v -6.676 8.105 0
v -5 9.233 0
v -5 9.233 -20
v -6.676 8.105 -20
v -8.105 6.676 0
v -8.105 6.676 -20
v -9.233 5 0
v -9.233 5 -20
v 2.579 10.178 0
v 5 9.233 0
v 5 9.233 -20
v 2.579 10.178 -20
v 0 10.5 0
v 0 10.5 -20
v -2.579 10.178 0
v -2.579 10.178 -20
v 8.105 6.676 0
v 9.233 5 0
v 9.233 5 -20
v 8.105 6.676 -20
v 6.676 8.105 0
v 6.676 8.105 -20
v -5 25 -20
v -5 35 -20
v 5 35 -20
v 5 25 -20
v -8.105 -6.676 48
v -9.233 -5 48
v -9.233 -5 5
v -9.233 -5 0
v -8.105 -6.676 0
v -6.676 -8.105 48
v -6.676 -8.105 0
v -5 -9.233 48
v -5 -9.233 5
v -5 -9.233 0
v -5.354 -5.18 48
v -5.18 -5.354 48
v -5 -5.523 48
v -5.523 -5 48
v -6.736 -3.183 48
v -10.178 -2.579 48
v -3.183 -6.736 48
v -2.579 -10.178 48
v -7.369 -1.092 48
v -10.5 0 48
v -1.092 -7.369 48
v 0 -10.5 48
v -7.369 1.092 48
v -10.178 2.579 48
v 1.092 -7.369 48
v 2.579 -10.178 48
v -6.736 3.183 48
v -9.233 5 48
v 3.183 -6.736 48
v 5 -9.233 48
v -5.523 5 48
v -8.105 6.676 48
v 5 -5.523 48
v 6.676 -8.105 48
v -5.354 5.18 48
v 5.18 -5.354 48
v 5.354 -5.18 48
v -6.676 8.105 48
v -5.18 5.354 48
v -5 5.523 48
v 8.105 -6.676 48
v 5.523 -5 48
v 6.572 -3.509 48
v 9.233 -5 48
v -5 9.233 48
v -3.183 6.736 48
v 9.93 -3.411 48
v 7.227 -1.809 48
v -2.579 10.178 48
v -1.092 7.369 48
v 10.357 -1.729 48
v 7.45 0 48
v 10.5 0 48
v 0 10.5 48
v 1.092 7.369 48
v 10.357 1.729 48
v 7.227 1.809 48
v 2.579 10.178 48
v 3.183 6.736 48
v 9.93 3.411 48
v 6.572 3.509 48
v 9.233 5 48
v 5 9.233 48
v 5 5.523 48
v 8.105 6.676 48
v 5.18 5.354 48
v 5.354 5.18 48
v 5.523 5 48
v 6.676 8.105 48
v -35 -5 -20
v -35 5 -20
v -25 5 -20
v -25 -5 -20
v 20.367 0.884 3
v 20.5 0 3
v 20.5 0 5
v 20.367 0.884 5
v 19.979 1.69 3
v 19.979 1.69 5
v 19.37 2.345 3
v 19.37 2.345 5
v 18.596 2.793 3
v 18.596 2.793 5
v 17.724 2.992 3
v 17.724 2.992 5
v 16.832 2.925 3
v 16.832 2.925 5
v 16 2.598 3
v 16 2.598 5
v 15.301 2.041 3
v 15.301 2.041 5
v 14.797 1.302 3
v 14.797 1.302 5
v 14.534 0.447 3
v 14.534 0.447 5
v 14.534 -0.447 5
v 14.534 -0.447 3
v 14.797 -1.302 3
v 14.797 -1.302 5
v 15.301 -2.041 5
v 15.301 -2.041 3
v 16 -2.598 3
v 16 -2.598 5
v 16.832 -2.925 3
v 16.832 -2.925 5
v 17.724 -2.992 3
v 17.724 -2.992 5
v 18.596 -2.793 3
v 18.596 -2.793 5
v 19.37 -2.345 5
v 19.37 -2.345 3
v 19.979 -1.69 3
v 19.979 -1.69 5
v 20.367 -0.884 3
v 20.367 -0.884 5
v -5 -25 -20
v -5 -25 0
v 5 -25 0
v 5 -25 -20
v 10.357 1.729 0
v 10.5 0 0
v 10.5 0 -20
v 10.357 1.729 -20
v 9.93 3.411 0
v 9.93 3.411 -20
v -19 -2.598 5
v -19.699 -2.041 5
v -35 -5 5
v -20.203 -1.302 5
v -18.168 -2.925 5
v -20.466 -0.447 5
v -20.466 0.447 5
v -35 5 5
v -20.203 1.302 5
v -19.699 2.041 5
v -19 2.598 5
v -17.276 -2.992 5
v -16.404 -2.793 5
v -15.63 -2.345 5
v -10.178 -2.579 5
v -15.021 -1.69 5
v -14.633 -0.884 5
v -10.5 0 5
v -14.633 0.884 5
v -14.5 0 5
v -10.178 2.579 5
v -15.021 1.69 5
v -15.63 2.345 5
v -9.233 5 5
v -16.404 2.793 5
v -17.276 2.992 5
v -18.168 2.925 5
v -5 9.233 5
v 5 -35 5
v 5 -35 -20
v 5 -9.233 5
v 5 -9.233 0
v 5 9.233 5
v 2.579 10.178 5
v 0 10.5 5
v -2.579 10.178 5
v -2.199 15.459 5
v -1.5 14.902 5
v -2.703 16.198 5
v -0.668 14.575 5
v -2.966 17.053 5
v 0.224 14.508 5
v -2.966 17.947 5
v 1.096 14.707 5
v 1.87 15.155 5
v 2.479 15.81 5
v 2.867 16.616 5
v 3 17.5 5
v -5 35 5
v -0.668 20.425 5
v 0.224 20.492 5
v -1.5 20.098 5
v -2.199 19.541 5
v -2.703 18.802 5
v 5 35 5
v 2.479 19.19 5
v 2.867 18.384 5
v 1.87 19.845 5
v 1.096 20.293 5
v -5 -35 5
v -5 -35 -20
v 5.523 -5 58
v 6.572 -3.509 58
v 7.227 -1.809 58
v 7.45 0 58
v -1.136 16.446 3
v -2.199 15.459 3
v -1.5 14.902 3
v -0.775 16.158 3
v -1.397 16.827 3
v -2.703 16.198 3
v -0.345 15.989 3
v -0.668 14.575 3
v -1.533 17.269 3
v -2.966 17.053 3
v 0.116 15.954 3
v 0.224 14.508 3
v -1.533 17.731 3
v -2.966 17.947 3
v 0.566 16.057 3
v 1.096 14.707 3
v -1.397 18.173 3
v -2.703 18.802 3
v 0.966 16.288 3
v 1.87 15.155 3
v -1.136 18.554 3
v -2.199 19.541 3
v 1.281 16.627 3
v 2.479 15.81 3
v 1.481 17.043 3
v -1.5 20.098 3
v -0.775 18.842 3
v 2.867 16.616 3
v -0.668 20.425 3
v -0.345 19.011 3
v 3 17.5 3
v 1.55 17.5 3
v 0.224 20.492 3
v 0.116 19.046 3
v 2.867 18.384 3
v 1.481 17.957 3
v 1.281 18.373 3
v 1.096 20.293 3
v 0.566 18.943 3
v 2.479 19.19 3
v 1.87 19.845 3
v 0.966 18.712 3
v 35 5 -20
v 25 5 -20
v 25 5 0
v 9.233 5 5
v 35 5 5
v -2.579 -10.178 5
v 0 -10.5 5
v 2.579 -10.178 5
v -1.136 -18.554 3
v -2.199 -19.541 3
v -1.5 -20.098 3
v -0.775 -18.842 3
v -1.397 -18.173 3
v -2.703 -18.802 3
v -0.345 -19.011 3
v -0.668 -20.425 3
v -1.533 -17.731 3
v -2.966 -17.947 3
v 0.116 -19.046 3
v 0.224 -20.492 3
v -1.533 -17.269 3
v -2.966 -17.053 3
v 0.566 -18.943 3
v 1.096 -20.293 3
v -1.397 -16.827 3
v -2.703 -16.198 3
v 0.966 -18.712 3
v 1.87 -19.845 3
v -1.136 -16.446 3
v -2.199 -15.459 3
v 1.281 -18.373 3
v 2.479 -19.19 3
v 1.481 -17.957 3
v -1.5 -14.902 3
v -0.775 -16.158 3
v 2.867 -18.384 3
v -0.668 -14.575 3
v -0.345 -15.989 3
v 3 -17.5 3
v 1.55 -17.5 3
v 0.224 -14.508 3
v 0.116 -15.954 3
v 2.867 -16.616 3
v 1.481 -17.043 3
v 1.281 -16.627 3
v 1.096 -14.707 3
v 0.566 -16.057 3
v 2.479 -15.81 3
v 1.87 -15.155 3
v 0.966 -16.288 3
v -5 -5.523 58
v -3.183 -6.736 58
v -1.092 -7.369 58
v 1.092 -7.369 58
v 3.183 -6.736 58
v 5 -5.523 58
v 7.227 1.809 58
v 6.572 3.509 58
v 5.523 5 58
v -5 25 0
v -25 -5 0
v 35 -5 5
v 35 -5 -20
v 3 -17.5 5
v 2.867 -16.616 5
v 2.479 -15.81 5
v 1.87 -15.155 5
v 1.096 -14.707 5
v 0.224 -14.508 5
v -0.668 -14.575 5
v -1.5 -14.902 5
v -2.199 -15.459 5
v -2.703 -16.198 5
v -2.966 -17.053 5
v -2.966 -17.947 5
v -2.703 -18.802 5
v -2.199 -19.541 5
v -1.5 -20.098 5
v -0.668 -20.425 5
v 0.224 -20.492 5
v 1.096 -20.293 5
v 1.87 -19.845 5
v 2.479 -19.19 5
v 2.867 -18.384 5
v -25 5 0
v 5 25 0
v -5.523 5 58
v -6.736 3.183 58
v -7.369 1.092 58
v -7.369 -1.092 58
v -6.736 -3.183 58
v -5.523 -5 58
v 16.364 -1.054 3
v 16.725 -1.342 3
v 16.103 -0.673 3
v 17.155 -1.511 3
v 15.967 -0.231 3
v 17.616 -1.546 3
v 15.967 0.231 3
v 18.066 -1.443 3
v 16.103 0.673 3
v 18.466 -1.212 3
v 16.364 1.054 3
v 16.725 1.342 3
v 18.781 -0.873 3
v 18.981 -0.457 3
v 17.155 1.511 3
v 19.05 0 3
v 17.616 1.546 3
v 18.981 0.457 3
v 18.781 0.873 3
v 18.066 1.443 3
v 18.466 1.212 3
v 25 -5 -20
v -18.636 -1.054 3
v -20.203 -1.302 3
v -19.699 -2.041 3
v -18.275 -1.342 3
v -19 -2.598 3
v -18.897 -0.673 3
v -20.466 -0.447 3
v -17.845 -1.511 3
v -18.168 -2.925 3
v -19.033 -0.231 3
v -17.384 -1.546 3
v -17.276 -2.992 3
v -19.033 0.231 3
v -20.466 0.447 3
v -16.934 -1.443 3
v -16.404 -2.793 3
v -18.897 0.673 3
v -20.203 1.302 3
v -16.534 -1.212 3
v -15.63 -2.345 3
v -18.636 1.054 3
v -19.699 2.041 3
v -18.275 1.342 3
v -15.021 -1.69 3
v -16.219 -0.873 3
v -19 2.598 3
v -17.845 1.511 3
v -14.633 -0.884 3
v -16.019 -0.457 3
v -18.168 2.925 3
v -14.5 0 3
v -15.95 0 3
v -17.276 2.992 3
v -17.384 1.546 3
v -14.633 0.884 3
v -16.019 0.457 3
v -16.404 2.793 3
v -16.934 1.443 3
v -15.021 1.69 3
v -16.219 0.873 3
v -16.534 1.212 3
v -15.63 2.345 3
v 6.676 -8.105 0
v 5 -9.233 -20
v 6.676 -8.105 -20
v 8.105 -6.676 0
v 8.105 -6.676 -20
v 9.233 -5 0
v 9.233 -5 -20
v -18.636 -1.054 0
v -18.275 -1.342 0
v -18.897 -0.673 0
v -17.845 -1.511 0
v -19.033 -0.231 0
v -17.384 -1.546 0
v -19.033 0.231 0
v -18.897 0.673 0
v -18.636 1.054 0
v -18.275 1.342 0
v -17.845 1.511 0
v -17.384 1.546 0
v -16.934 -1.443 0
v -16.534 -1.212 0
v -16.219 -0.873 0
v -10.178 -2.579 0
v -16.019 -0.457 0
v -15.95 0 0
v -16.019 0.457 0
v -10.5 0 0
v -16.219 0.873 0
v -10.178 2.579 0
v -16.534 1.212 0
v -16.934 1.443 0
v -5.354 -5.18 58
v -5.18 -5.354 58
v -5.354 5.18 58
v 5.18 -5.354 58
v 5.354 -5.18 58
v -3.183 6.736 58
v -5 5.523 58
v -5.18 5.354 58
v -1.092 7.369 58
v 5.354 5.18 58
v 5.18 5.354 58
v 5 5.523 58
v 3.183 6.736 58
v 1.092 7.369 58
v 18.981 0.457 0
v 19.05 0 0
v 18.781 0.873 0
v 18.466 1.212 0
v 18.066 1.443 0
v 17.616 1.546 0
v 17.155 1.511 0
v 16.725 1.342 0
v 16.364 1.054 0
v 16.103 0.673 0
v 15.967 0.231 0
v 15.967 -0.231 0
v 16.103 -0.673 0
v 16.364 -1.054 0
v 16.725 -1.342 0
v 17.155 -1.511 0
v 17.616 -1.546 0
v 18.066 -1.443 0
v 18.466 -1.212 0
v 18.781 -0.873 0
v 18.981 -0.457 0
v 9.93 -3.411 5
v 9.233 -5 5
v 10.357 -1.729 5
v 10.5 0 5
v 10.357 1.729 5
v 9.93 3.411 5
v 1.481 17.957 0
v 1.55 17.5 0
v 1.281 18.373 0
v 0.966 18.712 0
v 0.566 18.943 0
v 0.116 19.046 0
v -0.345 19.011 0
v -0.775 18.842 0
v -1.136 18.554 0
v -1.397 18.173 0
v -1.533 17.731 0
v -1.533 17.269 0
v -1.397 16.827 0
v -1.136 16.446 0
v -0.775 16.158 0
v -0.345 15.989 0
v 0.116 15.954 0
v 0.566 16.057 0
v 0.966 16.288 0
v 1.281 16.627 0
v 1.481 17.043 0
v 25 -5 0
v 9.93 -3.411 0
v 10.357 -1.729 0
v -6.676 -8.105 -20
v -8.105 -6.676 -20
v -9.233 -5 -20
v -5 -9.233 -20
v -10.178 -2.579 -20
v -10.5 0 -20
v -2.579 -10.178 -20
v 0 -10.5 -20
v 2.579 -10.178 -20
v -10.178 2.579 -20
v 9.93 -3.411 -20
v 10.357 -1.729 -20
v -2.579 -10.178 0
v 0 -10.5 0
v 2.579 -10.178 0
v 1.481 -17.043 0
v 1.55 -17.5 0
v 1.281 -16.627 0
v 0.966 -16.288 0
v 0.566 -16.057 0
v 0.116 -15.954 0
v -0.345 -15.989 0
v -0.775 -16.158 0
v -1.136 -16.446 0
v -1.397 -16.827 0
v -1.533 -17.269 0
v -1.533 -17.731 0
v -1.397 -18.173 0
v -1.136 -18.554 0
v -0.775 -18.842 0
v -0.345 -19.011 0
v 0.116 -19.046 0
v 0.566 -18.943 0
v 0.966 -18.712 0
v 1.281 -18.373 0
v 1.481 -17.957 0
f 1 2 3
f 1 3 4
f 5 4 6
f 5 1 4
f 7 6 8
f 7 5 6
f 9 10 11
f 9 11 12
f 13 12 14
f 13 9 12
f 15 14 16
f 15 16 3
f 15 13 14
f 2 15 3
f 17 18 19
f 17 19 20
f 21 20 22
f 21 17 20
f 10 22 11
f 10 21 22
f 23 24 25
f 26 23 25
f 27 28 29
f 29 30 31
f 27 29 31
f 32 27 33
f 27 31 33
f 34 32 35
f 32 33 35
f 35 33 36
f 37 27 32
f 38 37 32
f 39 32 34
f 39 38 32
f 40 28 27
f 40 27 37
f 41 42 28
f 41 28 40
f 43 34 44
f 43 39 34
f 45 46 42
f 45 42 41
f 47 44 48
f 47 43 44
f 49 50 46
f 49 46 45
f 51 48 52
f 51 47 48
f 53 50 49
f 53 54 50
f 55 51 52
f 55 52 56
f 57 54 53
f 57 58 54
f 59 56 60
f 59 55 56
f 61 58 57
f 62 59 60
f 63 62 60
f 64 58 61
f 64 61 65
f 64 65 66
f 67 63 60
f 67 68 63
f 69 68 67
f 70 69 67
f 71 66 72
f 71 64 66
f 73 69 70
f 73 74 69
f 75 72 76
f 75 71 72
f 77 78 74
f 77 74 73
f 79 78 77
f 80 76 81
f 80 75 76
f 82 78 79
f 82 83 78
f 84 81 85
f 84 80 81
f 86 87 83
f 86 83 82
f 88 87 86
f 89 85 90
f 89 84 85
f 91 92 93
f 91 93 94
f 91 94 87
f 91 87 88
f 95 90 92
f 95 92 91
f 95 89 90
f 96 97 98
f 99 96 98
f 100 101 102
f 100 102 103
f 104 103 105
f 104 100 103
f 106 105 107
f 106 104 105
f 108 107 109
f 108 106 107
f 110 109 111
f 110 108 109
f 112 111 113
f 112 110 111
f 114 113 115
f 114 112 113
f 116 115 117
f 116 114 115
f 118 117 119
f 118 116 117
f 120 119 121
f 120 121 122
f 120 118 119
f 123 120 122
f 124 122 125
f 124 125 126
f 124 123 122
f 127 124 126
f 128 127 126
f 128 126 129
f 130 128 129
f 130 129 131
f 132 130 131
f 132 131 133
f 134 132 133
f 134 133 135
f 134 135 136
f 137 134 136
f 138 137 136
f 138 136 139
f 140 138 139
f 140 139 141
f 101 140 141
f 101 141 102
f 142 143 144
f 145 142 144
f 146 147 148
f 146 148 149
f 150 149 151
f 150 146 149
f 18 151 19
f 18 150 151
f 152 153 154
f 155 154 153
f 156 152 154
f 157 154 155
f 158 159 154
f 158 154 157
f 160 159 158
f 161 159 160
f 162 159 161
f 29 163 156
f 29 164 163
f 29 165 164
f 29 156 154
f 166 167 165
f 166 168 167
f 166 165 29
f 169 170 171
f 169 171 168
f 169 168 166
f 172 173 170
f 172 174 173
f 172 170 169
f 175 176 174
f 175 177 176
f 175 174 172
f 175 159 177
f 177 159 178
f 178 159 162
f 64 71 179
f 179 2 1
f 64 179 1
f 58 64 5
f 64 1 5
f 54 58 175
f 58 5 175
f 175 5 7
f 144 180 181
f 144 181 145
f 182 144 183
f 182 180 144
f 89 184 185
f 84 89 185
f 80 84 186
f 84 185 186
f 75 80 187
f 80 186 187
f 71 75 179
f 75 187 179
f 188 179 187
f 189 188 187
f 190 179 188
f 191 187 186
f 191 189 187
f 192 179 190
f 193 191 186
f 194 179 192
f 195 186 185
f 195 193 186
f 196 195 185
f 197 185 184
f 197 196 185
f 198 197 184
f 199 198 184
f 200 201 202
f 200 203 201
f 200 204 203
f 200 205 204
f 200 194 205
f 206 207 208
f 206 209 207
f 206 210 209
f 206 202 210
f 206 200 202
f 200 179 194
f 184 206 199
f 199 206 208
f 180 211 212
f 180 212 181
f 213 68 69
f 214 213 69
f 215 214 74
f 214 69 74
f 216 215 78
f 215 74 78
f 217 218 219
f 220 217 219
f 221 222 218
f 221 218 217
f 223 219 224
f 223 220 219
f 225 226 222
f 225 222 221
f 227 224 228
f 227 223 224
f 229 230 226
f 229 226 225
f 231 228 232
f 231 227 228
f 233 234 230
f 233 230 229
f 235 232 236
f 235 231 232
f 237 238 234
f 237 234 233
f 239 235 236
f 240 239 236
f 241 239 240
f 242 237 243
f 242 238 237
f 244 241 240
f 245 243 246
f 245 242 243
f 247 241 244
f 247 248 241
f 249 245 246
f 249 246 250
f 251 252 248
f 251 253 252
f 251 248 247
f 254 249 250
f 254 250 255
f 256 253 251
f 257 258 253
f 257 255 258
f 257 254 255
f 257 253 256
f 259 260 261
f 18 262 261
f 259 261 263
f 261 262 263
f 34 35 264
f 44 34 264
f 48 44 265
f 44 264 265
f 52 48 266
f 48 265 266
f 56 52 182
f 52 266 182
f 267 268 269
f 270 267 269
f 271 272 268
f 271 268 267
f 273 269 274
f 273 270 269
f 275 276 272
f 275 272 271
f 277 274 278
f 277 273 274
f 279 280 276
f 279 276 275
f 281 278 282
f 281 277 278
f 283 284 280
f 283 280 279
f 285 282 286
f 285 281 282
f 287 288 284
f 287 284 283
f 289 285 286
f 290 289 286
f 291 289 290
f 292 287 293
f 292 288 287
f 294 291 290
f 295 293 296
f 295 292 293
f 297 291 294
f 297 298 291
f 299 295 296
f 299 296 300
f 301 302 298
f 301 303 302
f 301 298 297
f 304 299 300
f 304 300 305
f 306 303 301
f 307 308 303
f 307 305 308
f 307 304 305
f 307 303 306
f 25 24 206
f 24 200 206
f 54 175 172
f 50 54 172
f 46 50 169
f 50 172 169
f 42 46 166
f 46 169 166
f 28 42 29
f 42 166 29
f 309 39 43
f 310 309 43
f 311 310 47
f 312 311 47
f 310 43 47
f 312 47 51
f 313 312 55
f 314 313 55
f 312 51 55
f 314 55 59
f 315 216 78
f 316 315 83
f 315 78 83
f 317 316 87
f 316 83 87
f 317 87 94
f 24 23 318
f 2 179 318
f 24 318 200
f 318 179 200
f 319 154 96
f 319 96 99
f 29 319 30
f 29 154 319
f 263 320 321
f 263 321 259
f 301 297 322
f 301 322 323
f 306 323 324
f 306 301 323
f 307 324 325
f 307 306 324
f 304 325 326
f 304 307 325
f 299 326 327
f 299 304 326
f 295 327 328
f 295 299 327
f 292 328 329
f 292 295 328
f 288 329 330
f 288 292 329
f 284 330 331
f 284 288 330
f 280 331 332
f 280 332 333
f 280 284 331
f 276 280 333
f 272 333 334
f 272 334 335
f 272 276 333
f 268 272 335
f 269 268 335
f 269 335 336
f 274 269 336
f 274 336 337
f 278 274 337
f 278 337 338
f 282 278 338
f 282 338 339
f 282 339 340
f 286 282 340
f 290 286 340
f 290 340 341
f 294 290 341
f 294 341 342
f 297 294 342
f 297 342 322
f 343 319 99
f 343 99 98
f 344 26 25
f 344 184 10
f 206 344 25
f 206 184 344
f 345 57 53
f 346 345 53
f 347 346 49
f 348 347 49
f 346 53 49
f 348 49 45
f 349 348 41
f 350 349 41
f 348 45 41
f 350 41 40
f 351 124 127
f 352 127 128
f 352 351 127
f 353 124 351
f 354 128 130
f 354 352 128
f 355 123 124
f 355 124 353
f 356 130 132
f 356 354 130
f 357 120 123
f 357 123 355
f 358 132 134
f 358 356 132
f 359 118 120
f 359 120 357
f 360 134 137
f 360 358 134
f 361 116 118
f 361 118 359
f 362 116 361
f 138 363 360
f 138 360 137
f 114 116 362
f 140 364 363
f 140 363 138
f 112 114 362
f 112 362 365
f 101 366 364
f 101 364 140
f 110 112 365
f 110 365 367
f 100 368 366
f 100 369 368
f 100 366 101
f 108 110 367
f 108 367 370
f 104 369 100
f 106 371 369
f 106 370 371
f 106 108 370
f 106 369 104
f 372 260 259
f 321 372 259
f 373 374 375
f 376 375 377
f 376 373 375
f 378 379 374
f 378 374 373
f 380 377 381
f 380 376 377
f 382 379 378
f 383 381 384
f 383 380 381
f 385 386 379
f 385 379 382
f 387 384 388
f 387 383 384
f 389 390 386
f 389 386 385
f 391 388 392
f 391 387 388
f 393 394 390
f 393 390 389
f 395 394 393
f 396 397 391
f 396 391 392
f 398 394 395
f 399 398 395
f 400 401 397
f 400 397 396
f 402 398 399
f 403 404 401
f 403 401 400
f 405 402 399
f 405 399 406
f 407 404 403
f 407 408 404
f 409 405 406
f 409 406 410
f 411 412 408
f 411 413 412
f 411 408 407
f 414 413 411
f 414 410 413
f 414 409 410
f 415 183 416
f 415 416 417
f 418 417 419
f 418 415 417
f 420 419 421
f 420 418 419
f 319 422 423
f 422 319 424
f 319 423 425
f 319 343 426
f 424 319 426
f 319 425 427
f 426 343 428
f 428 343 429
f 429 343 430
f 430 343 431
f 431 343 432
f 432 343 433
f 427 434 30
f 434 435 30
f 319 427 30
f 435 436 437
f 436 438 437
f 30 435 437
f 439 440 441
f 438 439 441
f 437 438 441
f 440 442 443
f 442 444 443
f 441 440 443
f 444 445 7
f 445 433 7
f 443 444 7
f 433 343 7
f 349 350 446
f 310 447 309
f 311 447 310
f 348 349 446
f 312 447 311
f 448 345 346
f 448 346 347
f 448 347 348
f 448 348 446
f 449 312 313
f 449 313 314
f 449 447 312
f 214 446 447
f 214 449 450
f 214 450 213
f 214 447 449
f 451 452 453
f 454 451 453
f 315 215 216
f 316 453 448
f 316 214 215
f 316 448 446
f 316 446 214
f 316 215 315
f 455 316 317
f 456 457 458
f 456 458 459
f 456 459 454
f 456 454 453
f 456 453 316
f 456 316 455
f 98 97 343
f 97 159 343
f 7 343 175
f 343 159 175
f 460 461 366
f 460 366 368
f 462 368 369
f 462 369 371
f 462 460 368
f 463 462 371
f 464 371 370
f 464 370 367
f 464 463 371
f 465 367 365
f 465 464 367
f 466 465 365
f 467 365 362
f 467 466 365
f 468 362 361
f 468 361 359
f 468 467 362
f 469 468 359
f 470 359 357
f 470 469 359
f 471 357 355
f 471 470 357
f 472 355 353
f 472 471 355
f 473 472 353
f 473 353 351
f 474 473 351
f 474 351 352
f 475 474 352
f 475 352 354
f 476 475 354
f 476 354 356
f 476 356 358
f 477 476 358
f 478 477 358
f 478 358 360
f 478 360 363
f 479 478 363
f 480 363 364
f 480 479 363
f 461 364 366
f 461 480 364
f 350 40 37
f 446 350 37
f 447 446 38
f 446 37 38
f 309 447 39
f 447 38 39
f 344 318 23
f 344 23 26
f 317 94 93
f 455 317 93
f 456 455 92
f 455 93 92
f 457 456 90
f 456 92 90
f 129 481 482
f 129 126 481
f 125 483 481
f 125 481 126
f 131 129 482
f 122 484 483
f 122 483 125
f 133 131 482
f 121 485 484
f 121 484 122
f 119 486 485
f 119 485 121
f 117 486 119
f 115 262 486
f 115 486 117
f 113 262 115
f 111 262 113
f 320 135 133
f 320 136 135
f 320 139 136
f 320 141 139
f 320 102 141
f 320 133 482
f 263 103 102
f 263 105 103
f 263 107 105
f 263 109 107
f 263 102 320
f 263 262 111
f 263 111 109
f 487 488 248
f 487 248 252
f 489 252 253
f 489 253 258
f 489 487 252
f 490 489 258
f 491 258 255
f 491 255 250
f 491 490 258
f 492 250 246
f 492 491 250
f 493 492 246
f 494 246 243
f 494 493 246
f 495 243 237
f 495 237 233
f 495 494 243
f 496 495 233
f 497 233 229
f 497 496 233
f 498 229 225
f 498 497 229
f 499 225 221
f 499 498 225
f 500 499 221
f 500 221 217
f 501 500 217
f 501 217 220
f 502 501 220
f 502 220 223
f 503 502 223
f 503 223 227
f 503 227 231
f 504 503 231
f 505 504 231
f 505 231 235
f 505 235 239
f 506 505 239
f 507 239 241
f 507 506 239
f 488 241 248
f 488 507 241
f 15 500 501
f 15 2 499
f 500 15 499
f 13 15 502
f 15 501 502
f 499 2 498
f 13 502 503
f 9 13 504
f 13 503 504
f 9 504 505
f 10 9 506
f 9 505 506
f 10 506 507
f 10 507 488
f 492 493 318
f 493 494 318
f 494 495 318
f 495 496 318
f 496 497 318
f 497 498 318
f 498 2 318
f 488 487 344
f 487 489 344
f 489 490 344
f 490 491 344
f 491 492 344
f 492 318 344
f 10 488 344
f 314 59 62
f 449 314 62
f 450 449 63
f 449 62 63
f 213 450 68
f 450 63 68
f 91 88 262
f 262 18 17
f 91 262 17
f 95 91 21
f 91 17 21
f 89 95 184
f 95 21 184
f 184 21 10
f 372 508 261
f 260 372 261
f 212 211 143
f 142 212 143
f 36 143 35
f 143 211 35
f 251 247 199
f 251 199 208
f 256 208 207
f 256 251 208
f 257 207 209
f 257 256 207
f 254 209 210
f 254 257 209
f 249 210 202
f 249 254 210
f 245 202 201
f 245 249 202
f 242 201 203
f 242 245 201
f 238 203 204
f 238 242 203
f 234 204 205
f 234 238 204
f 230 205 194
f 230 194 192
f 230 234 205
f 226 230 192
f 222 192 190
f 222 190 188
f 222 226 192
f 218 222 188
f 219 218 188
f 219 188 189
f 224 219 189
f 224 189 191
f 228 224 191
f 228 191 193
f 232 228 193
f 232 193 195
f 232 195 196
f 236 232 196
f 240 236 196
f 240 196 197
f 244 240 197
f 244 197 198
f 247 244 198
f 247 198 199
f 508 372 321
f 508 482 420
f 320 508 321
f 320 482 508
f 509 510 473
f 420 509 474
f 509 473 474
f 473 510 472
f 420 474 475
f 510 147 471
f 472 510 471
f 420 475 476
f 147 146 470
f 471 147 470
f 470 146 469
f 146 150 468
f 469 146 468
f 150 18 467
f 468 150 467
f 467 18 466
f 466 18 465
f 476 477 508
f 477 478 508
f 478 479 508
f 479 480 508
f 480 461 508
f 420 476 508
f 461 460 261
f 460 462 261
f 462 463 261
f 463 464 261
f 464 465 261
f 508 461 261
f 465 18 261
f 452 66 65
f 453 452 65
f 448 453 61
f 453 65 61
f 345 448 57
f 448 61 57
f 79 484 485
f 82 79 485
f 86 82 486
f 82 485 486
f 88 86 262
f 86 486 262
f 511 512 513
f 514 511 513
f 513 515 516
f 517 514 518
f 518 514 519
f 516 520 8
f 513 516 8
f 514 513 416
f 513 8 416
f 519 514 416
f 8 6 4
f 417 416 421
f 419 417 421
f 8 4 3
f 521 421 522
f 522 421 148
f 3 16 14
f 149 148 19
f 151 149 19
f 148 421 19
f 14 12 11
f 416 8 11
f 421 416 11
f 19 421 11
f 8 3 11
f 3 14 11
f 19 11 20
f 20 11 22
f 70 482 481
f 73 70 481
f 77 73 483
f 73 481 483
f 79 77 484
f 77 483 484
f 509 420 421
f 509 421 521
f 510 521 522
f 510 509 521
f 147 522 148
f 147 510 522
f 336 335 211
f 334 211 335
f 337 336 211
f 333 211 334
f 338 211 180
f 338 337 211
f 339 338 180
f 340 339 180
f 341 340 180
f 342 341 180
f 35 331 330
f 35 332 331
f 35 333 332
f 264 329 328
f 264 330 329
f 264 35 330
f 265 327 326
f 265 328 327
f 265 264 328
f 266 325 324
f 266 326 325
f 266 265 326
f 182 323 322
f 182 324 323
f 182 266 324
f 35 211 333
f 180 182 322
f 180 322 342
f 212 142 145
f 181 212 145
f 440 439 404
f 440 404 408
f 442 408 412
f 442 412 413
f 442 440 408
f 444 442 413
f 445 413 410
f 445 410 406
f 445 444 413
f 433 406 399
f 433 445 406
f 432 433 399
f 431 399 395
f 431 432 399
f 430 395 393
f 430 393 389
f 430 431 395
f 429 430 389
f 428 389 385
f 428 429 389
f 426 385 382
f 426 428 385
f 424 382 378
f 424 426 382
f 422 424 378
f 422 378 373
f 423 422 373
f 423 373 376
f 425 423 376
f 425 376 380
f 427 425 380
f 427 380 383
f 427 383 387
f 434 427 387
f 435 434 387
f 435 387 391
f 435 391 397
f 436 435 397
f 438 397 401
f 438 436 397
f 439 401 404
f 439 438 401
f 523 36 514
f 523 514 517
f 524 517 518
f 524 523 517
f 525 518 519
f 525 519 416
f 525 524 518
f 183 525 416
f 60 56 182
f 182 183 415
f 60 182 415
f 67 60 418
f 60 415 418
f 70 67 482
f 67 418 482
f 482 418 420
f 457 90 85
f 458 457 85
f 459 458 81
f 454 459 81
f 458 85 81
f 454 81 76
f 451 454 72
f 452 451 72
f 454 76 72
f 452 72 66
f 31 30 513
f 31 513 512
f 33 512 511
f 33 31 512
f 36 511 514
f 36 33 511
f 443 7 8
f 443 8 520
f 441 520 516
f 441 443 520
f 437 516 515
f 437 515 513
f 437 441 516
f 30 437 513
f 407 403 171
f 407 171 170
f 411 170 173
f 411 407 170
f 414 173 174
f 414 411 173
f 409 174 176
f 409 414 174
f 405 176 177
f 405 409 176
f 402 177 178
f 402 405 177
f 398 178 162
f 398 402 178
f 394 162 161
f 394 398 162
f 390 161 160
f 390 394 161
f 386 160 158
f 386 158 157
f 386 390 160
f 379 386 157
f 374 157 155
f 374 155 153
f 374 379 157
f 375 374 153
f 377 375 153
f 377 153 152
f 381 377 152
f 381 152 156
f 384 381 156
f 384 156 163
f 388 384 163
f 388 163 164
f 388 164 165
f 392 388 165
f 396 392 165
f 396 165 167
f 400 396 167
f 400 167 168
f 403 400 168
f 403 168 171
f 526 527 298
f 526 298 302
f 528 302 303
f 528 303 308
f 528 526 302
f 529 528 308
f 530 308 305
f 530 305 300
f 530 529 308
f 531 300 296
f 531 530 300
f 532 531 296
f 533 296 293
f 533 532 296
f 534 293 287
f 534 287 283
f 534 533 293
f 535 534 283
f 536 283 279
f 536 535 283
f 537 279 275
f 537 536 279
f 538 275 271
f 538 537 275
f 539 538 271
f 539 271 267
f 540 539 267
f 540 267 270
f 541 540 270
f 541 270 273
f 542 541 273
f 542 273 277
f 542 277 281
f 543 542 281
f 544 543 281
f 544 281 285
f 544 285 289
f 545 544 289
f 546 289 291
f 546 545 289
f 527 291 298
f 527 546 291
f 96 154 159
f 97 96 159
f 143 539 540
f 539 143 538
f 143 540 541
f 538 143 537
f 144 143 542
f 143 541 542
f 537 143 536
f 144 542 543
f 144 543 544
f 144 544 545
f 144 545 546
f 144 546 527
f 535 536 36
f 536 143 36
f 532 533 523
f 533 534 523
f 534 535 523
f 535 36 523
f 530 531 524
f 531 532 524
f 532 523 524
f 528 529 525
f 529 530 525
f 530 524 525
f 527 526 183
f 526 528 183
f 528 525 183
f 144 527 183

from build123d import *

# Parameters (mm, degrees)
F0_R          = 3
F1_DEPTH      = 5
F0_R_2        = 1.55
F2_DEPTH      = 3
F0_W          = 10
F0_H          = 10
F3_DEPTH      = 5
F3_DEPTH_BACK = 20
F4_DEPTH      = 48
F4_DEPTH_BACK = 20
F5_DEPTH      = 58


with BuildPart() as f1:
    # F0 (on Top) → F1 (new body)
    with BuildSketch(Plane.XY):
        with BuildLine():
            ThreePointArc((-9.2330926563, -5), (-10.5, 0), (-9.2330926563, 5))
            Line((-9.2330926563, 5), (-25, 5))
            Line((-25, 5), (-25, -5))
            Line((-25, -5), (-9.2330926563, -5))
        make_face()
        with Locations((-17.5, 0)):
            Circle(F0_R, mode=Mode.SUBTRACT)
    extrude(amount=F1_DEPTH)

    # F0 (on Top) → F2, piece 4 (join)
    with BuildSketch(Plane.XY):
        with Locations((-17.5, 0)):
            Circle(F0_R)
        with Locations((-17.5, 0)):
            Circle(F0_R_2, mode=Mode.SUBTRACT)
    extrude(amount=F2_DEPTH)

    # F0 (on Top) → F3, piece 4 (join, two sides)
    with BuildSketch(Plane.XY) as f3_4_sk:
        with Locations((-30, 0)):
            Rectangle(F0_W, F0_H)
    extrude(amount=F3_DEPTH)
    extrude(f3_4_sk.sketch, amount=-F3_DEPTH_BACK)



with BuildPart() as f1b:
    # F0 (on Top) → F1, piece 2 (new body)
    with BuildSketch(Plane.XY):
        with BuildLine():
            ThreePointArc((-5, 9.2330926563), (0, 10.5), (5, 9.2330926563))
            Line((5, 9.2330926563), (5, 25))
            Line((5, 25), (-5, 25))
            Line((-5, 25), (-5, 9.2330926563))
        make_face()
        with Locations((0, 17.5)):
            Circle(F0_R, mode=Mode.SUBTRACT)
    extrude(amount=F1_DEPTH)

    # F0 (on Top) → F2 (join)
    with BuildSketch(Plane.XY):
        with Locations((0, 17.5)):
            Circle(F0_R)
        with Locations((0, 17.5)):
            Circle(F0_R_2, mode=Mode.SUBTRACT)
    extrude(amount=F2_DEPTH)

    # F0 (on Top) → F3 (join, two sides)
    with BuildSketch(Plane.XY) as f3_sk:
        with Locations((0, 30)):
            Rectangle(F0_W, F0_H)
    extrude(amount=F3_DEPTH)
    extrude(f3_sk.sketch, amount=-F3_DEPTH_BACK)


with BuildPart() as f1c:
    # F0 (on Top) → F1, piece 3 (new body)
    with BuildSketch(Plane.XY):
        with BuildLine():
            Line((25, 5), (9.2330926563, 5))
            ThreePointArc((9.2330926563, 5), (10.1783464495, 2.5790043727), (10.5, 0))
            ThreePointArc((10.5, 0), (10.1783464495, -2.5790043727), (9.2330926563, -5))
            Line((9.2330926563, -5), (25, -5))
            Line((25, -5), (25, 5))
        make_face()
        with Locations((17.5, 0)):
            Circle(F0_R, mode=Mode.SUBTRACT)
    extrude(amount=F1_DEPTH)

    # F0 (on Top) → F2, piece 2 (join)
    with BuildSketch(Plane.XY):
        with Locations((17.5, 0)):
            Circle(F0_R)
        with Locations((17.5, 0)):
            Circle(F0_R_2, mode=Mode.SUBTRACT)
    extrude(amount=F2_DEPTH)

    # F0 (on Top) → F3, piece 2 (join, two sides)
    with BuildSketch(Plane.XY) as f3_2_sk:
        with Locations((30, 0)):
            Rectangle(F0_W, F0_H)
    extrude(amount=F3_DEPTH)
    extrude(f3_2_sk.sketch, amount=-F3_DEPTH_BACK)


with BuildPart() as f1d:
    # F0 (on Top) → F1, piece 4 (new body)
    with BuildSketch(Plane.XY):
        with BuildLine():
            Line((5, -25), (5, -9.2330926563))
            ThreePointArc((5, -9.2330926563), (0, -10.5), (-5, -9.2330926563))
            Line((-5, -9.2330926563), (-5, -25))
            Line((-5, -25), (5, -25))
        make_face()
        with Locations((0, -17.5)):
            Circle(F0_R, mode=Mode.SUBTRACT)
    extrude(amount=F1_DEPTH)

    # F0 (on Top) → F2, piece 3 (join)
    with BuildSketch(Plane.XY):
        with Locations((0, -17.5)):
            Circle(F0_R)
        with Locations((0, -17.5)):
            Circle(F0_R_2, mode=Mode.SUBTRACT)
    extrude(amount=F2_DEPTH)

    # F0 (on Top) → F3, piece 3 (join, two sides)
    with BuildSketch(Plane.XY) as f3_3_sk:
        with Locations((0, -30)):
            Rectangle(F0_W, F0_H)
    extrude(amount=F3_DEPTH)
    extrude(f3_3_sk.sketch, amount=-F3_DEPTH_BACK)


with BuildPart() as f1_1:
    add(f1.part)

    add(f1b.part)  # F4 merges F1b

    add(f1c.part)  # F4 merges F1c

    add(f1d.part)  # F4 merges F1d
    # F0 (on Top) → F4 (join, two sides)
    with BuildSketch(Plane.XY) as f4_sk:
        with BuildLine():
            Line((-5, -9.2330926563), (-5, -5.5229068433))
            ThreePointArc((-5, -5.5229068433), (-5.2679455198, -5.2679455198), (-5.5229068433, -5))
            Line((-5.5229068433, -5), (-9.2330926563, -5))
            ThreePointArc((-9.2330926563, -5), (-7.4246212025, -7.4246212025), (-5, -9.2330926563))
        make_face()
        with BuildLine():
            ThreePointArc((-5.5229068433, -5), (-7.45, 0), (-5.5229068433, 5))
            Line((-5.5229068433, 5), (-9.2330926563, 5))
            ThreePointArc((-9.2330926563, 5), (-10.5, 0), (-9.2330926563, -5))
            Line((-9.2330926563, -5), (-5.5229068433, -5))
        make_face()
        with BuildLine():
            Line((-5, -5), (-5, 5))
            Line((-5, 5), (-5.5229068433, 5))
            ThreePointArc((-5.5229068433, 5), (-7.45, 0), (-5.5229068433, -5))
            Line((-5.5229068433, -5), (-5, -5))
        make_face()
        with BuildLine():
            ThreePointArc((-5.5229068433, -5), (-5.2679455198, -5.2679455198), (-5, -5.5229068433))
            Line((-5, -5.5229068433), (-5, -5))
            Line((-5, -5), (-5.5229068433, -5))
        make_face()
        with BuildLine():
            ThreePointArc((-5, -5.5229068433), (0, -7.45), (5, -5.5229068433))
            Line((5, -5.5229068433), (5, -5))
            Line((5, -5), (-5, -5))
            Line((-5, -5), (-5, -5.5229068433))
        make_face()
        with BuildLine():
            Line((5, -9.2330926563), (5, -5.5229068433))
            ThreePointArc((5, -5.5229068433), (0, -7.45), (-5, -5.5229068433))
            Line((-5, -5.5229068433), (-5, -9.2330926563))
            ThreePointArc((-5, -9.2330926563), (0, -10.5), (5, -9.2330926563))
        make_face()
        Rectangle(F0_W, F0_H)
        with BuildLine():
            ThreePointArc((5.5229068433, -5), (6.9515522001, -2.6792577346), (7.45, 0))
            ThreePointArc((7.45, 0), (6.9515522001, 2.6792577346), (5.5229068433, 5))
            Line((5.5229068433, 5), (5, 5))
            Line((5, 5), (5, -5))
            Line((5, -5), (5.5229068433, -5))
        make_face()
        with BuildLine():
            Line((9.2330926563, -5), (5.5229068433, -5))
            ThreePointArc((5.5229068433, -5), (5.2679455198, -5.2679455198), (5, -5.5229068433))
            Line((5, -5.5229068433), (5, -9.2330926563))
            ThreePointArc((5, -9.2330926563), (7.4246212025, -7.4246212025), (9.2330926563, -5))
        make_face()
        with BuildLine():
            ThreePointArc((5, -5.5229068433), (5.2679455198, -5.2679455198), (5.5229068433, -5))
            Line((5.5229068433, -5), (5, -5))
            Line((5, -5), (5, -5.5229068433))
        make_face()
        with BuildLine():
            ThreePointArc((5.5229068433, 5), (6.9515522001, 2.6792577346), (7.45, 0))
            ThreePointArc((7.45, 0), (6.9515522001, -2.6792577346), (5.5229068433, -5))
            Line((5.5229068433, -5), (9.2330926563, -5))
            ThreePointArc((9.2330926563, -5), (10.1783464495, -2.5790043727), (10.5, 0))
            ThreePointArc((10.5, 0), (10.1783464495, 2.5790043727), (9.2330926563, 5))
            Line((9.2330926563, 5), (5.5229068433, 5))
        make_face()
        with BuildLine():
            Line((5, 5), (5.5229068433, 5))
            ThreePointArc((5.5229068433, 5), (5.2679455198, 5.2679455198), (5, 5.5229068433))
            Line((5, 5.5229068433), (5, 5))
        make_face()
        with BuildLine():
            ThreePointArc((5, 5.5229068433), (5.2679455198, 5.2679455198), (5.5229068433, 5))
            Line((5.5229068433, 5), (9.2330926563, 5))
            ThreePointArc((9.2330926563, 5), (7.4246212025, 7.4246212025), (5, 9.2330926563))
            Line((5, 9.2330926563), (5, 5.5229068433))
        make_face()
        with BuildLine():
            Line((5, 5), (5, 5.5229068433))
            ThreePointArc((5, 5.5229068433), (0, 7.45), (-5, 5.5229068433))
            Line((-5, 5.5229068433), (-5, 5))
            Line((-5, 5), (5, 5))
        make_face()
        with BuildLine():
            ThreePointArc((-5, 5.5229068433), (0, 7.45), (5, 5.5229068433))
            Line((5, 5.5229068433), (5, 9.2330926563))
            ThreePointArc((5, 9.2330926563), (0, 10.5), (-5, 9.2330926563))
            Line((-5, 9.2330926563), (-5, 5.5229068433))
        make_face()
        with BuildLine():
            ThreePointArc((-5.5229068433, 5), (-5.2679455198, 5.2679455198), (-5, 5.5229068433))
            Line((-5, 5.5229068433), (-5, 9.2330926563))
            ThreePointArc((-5, 9.2330926563), (-7.4246212025, 7.4246212025), (-9.2330926563, 5))
            Line((-9.2330926563, 5), (-5.5229068433, 5))
        make_face()
        with BuildLine():
            Line((-5, 5), (-5, 5.5229068433))
            ThreePointArc((-5, 5.5229068433), (-5.2679455198, 5.2679455198), (-5.5229068433, 5))
            Line((-5.5229068433, 5), (-5, 5))
        make_face()
    extrude(amount=F4_DEPTH)
    extrude(f4_sk.sketch, amount=-F4_DEPTH_BACK)

    # F0 (on Top) → F5 (join)
    with BuildSketch(Plane.XY):
        Rectangle(F0_W, F0_H)
        with BuildLine():
            Line((-5, -5), (-5, 5))
            Line((-5, 5), (-5.5229068433, 5))
            ThreePointArc((-5.5229068433, 5), (-7.45, 0), (-5.5229068433, -5))
            Line((-5.5229068433, -5), (-5, -5))
        make_face()
        with BuildLine():
            Line((5, 5), (5, 5.5229068433))
            ThreePointArc((5, 5.5229068433), (0, 7.45), (-5, 5.5229068433))
            Line((-5, 5.5229068433), (-5, 5))
            Line((-5, 5), (5, 5))
        make_face()
        with BuildLine():
            ThreePointArc((5.5229068433, -5), (6.9515522001, -2.6792577346), (7.45, 0))
            ThreePointArc((7.45, 0), (6.9515522001, 2.6792577346), (5.5229068433, 5))
            Line((5.5229068433, 5), (5, 5))
            Line((5, 5), (5, -5))
            Line((5, -5), (5.5229068433, -5))
        make_face()
        with BuildLine():
            ThreePointArc((-5, -5.5229068433), (0, -7.45), (5, -5.5229068433))
            Line((5, -5.5229068433), (5, -5))
            Line((5, -5), (-5, -5))
            Line((-5, -5), (-5, -5.5229068433))
        make_face()
        with BuildLine():
            ThreePointArc((-5.5229068433, -5), (-5.2679455198, -5.2679455198), (-5, -5.5229068433))
            Line((-5, -5.5229068433), (-5, -5))
            Line((-5, -5), (-5.5229068433, -5))
        make_face()
        with BuildLine():
            ThreePointArc((5, -5.5229068433), (5.2679455198, -5.2679455198), (5.5229068433, -5))
            Line((5.5229068433, -5), (5, -5))
            Line((5, -5), (5, -5.5229068433))
        make_face()
        with BuildLine():
            Line((5, 5), (5.5229068433, 5))
            ThreePointArc((5.5229068433, 5), (5.2679455198, 5.2679455198), (5, 5.5229068433))
            Line((5, 5.5229068433), (5, 5))
        make_face()
        with BuildLine():
            Line((-5, 5), (-5, 5.5229068433))
            ThreePointArc((-5, 5.5229068433), (-5.2679455198, 5.2679455198), (-5.5229068433, 5))
            Line((-5.5229068433, 5), (-5, 5))
        make_face()
    extrude(amount=F5_DEPTH)


solid = f1_1.part
